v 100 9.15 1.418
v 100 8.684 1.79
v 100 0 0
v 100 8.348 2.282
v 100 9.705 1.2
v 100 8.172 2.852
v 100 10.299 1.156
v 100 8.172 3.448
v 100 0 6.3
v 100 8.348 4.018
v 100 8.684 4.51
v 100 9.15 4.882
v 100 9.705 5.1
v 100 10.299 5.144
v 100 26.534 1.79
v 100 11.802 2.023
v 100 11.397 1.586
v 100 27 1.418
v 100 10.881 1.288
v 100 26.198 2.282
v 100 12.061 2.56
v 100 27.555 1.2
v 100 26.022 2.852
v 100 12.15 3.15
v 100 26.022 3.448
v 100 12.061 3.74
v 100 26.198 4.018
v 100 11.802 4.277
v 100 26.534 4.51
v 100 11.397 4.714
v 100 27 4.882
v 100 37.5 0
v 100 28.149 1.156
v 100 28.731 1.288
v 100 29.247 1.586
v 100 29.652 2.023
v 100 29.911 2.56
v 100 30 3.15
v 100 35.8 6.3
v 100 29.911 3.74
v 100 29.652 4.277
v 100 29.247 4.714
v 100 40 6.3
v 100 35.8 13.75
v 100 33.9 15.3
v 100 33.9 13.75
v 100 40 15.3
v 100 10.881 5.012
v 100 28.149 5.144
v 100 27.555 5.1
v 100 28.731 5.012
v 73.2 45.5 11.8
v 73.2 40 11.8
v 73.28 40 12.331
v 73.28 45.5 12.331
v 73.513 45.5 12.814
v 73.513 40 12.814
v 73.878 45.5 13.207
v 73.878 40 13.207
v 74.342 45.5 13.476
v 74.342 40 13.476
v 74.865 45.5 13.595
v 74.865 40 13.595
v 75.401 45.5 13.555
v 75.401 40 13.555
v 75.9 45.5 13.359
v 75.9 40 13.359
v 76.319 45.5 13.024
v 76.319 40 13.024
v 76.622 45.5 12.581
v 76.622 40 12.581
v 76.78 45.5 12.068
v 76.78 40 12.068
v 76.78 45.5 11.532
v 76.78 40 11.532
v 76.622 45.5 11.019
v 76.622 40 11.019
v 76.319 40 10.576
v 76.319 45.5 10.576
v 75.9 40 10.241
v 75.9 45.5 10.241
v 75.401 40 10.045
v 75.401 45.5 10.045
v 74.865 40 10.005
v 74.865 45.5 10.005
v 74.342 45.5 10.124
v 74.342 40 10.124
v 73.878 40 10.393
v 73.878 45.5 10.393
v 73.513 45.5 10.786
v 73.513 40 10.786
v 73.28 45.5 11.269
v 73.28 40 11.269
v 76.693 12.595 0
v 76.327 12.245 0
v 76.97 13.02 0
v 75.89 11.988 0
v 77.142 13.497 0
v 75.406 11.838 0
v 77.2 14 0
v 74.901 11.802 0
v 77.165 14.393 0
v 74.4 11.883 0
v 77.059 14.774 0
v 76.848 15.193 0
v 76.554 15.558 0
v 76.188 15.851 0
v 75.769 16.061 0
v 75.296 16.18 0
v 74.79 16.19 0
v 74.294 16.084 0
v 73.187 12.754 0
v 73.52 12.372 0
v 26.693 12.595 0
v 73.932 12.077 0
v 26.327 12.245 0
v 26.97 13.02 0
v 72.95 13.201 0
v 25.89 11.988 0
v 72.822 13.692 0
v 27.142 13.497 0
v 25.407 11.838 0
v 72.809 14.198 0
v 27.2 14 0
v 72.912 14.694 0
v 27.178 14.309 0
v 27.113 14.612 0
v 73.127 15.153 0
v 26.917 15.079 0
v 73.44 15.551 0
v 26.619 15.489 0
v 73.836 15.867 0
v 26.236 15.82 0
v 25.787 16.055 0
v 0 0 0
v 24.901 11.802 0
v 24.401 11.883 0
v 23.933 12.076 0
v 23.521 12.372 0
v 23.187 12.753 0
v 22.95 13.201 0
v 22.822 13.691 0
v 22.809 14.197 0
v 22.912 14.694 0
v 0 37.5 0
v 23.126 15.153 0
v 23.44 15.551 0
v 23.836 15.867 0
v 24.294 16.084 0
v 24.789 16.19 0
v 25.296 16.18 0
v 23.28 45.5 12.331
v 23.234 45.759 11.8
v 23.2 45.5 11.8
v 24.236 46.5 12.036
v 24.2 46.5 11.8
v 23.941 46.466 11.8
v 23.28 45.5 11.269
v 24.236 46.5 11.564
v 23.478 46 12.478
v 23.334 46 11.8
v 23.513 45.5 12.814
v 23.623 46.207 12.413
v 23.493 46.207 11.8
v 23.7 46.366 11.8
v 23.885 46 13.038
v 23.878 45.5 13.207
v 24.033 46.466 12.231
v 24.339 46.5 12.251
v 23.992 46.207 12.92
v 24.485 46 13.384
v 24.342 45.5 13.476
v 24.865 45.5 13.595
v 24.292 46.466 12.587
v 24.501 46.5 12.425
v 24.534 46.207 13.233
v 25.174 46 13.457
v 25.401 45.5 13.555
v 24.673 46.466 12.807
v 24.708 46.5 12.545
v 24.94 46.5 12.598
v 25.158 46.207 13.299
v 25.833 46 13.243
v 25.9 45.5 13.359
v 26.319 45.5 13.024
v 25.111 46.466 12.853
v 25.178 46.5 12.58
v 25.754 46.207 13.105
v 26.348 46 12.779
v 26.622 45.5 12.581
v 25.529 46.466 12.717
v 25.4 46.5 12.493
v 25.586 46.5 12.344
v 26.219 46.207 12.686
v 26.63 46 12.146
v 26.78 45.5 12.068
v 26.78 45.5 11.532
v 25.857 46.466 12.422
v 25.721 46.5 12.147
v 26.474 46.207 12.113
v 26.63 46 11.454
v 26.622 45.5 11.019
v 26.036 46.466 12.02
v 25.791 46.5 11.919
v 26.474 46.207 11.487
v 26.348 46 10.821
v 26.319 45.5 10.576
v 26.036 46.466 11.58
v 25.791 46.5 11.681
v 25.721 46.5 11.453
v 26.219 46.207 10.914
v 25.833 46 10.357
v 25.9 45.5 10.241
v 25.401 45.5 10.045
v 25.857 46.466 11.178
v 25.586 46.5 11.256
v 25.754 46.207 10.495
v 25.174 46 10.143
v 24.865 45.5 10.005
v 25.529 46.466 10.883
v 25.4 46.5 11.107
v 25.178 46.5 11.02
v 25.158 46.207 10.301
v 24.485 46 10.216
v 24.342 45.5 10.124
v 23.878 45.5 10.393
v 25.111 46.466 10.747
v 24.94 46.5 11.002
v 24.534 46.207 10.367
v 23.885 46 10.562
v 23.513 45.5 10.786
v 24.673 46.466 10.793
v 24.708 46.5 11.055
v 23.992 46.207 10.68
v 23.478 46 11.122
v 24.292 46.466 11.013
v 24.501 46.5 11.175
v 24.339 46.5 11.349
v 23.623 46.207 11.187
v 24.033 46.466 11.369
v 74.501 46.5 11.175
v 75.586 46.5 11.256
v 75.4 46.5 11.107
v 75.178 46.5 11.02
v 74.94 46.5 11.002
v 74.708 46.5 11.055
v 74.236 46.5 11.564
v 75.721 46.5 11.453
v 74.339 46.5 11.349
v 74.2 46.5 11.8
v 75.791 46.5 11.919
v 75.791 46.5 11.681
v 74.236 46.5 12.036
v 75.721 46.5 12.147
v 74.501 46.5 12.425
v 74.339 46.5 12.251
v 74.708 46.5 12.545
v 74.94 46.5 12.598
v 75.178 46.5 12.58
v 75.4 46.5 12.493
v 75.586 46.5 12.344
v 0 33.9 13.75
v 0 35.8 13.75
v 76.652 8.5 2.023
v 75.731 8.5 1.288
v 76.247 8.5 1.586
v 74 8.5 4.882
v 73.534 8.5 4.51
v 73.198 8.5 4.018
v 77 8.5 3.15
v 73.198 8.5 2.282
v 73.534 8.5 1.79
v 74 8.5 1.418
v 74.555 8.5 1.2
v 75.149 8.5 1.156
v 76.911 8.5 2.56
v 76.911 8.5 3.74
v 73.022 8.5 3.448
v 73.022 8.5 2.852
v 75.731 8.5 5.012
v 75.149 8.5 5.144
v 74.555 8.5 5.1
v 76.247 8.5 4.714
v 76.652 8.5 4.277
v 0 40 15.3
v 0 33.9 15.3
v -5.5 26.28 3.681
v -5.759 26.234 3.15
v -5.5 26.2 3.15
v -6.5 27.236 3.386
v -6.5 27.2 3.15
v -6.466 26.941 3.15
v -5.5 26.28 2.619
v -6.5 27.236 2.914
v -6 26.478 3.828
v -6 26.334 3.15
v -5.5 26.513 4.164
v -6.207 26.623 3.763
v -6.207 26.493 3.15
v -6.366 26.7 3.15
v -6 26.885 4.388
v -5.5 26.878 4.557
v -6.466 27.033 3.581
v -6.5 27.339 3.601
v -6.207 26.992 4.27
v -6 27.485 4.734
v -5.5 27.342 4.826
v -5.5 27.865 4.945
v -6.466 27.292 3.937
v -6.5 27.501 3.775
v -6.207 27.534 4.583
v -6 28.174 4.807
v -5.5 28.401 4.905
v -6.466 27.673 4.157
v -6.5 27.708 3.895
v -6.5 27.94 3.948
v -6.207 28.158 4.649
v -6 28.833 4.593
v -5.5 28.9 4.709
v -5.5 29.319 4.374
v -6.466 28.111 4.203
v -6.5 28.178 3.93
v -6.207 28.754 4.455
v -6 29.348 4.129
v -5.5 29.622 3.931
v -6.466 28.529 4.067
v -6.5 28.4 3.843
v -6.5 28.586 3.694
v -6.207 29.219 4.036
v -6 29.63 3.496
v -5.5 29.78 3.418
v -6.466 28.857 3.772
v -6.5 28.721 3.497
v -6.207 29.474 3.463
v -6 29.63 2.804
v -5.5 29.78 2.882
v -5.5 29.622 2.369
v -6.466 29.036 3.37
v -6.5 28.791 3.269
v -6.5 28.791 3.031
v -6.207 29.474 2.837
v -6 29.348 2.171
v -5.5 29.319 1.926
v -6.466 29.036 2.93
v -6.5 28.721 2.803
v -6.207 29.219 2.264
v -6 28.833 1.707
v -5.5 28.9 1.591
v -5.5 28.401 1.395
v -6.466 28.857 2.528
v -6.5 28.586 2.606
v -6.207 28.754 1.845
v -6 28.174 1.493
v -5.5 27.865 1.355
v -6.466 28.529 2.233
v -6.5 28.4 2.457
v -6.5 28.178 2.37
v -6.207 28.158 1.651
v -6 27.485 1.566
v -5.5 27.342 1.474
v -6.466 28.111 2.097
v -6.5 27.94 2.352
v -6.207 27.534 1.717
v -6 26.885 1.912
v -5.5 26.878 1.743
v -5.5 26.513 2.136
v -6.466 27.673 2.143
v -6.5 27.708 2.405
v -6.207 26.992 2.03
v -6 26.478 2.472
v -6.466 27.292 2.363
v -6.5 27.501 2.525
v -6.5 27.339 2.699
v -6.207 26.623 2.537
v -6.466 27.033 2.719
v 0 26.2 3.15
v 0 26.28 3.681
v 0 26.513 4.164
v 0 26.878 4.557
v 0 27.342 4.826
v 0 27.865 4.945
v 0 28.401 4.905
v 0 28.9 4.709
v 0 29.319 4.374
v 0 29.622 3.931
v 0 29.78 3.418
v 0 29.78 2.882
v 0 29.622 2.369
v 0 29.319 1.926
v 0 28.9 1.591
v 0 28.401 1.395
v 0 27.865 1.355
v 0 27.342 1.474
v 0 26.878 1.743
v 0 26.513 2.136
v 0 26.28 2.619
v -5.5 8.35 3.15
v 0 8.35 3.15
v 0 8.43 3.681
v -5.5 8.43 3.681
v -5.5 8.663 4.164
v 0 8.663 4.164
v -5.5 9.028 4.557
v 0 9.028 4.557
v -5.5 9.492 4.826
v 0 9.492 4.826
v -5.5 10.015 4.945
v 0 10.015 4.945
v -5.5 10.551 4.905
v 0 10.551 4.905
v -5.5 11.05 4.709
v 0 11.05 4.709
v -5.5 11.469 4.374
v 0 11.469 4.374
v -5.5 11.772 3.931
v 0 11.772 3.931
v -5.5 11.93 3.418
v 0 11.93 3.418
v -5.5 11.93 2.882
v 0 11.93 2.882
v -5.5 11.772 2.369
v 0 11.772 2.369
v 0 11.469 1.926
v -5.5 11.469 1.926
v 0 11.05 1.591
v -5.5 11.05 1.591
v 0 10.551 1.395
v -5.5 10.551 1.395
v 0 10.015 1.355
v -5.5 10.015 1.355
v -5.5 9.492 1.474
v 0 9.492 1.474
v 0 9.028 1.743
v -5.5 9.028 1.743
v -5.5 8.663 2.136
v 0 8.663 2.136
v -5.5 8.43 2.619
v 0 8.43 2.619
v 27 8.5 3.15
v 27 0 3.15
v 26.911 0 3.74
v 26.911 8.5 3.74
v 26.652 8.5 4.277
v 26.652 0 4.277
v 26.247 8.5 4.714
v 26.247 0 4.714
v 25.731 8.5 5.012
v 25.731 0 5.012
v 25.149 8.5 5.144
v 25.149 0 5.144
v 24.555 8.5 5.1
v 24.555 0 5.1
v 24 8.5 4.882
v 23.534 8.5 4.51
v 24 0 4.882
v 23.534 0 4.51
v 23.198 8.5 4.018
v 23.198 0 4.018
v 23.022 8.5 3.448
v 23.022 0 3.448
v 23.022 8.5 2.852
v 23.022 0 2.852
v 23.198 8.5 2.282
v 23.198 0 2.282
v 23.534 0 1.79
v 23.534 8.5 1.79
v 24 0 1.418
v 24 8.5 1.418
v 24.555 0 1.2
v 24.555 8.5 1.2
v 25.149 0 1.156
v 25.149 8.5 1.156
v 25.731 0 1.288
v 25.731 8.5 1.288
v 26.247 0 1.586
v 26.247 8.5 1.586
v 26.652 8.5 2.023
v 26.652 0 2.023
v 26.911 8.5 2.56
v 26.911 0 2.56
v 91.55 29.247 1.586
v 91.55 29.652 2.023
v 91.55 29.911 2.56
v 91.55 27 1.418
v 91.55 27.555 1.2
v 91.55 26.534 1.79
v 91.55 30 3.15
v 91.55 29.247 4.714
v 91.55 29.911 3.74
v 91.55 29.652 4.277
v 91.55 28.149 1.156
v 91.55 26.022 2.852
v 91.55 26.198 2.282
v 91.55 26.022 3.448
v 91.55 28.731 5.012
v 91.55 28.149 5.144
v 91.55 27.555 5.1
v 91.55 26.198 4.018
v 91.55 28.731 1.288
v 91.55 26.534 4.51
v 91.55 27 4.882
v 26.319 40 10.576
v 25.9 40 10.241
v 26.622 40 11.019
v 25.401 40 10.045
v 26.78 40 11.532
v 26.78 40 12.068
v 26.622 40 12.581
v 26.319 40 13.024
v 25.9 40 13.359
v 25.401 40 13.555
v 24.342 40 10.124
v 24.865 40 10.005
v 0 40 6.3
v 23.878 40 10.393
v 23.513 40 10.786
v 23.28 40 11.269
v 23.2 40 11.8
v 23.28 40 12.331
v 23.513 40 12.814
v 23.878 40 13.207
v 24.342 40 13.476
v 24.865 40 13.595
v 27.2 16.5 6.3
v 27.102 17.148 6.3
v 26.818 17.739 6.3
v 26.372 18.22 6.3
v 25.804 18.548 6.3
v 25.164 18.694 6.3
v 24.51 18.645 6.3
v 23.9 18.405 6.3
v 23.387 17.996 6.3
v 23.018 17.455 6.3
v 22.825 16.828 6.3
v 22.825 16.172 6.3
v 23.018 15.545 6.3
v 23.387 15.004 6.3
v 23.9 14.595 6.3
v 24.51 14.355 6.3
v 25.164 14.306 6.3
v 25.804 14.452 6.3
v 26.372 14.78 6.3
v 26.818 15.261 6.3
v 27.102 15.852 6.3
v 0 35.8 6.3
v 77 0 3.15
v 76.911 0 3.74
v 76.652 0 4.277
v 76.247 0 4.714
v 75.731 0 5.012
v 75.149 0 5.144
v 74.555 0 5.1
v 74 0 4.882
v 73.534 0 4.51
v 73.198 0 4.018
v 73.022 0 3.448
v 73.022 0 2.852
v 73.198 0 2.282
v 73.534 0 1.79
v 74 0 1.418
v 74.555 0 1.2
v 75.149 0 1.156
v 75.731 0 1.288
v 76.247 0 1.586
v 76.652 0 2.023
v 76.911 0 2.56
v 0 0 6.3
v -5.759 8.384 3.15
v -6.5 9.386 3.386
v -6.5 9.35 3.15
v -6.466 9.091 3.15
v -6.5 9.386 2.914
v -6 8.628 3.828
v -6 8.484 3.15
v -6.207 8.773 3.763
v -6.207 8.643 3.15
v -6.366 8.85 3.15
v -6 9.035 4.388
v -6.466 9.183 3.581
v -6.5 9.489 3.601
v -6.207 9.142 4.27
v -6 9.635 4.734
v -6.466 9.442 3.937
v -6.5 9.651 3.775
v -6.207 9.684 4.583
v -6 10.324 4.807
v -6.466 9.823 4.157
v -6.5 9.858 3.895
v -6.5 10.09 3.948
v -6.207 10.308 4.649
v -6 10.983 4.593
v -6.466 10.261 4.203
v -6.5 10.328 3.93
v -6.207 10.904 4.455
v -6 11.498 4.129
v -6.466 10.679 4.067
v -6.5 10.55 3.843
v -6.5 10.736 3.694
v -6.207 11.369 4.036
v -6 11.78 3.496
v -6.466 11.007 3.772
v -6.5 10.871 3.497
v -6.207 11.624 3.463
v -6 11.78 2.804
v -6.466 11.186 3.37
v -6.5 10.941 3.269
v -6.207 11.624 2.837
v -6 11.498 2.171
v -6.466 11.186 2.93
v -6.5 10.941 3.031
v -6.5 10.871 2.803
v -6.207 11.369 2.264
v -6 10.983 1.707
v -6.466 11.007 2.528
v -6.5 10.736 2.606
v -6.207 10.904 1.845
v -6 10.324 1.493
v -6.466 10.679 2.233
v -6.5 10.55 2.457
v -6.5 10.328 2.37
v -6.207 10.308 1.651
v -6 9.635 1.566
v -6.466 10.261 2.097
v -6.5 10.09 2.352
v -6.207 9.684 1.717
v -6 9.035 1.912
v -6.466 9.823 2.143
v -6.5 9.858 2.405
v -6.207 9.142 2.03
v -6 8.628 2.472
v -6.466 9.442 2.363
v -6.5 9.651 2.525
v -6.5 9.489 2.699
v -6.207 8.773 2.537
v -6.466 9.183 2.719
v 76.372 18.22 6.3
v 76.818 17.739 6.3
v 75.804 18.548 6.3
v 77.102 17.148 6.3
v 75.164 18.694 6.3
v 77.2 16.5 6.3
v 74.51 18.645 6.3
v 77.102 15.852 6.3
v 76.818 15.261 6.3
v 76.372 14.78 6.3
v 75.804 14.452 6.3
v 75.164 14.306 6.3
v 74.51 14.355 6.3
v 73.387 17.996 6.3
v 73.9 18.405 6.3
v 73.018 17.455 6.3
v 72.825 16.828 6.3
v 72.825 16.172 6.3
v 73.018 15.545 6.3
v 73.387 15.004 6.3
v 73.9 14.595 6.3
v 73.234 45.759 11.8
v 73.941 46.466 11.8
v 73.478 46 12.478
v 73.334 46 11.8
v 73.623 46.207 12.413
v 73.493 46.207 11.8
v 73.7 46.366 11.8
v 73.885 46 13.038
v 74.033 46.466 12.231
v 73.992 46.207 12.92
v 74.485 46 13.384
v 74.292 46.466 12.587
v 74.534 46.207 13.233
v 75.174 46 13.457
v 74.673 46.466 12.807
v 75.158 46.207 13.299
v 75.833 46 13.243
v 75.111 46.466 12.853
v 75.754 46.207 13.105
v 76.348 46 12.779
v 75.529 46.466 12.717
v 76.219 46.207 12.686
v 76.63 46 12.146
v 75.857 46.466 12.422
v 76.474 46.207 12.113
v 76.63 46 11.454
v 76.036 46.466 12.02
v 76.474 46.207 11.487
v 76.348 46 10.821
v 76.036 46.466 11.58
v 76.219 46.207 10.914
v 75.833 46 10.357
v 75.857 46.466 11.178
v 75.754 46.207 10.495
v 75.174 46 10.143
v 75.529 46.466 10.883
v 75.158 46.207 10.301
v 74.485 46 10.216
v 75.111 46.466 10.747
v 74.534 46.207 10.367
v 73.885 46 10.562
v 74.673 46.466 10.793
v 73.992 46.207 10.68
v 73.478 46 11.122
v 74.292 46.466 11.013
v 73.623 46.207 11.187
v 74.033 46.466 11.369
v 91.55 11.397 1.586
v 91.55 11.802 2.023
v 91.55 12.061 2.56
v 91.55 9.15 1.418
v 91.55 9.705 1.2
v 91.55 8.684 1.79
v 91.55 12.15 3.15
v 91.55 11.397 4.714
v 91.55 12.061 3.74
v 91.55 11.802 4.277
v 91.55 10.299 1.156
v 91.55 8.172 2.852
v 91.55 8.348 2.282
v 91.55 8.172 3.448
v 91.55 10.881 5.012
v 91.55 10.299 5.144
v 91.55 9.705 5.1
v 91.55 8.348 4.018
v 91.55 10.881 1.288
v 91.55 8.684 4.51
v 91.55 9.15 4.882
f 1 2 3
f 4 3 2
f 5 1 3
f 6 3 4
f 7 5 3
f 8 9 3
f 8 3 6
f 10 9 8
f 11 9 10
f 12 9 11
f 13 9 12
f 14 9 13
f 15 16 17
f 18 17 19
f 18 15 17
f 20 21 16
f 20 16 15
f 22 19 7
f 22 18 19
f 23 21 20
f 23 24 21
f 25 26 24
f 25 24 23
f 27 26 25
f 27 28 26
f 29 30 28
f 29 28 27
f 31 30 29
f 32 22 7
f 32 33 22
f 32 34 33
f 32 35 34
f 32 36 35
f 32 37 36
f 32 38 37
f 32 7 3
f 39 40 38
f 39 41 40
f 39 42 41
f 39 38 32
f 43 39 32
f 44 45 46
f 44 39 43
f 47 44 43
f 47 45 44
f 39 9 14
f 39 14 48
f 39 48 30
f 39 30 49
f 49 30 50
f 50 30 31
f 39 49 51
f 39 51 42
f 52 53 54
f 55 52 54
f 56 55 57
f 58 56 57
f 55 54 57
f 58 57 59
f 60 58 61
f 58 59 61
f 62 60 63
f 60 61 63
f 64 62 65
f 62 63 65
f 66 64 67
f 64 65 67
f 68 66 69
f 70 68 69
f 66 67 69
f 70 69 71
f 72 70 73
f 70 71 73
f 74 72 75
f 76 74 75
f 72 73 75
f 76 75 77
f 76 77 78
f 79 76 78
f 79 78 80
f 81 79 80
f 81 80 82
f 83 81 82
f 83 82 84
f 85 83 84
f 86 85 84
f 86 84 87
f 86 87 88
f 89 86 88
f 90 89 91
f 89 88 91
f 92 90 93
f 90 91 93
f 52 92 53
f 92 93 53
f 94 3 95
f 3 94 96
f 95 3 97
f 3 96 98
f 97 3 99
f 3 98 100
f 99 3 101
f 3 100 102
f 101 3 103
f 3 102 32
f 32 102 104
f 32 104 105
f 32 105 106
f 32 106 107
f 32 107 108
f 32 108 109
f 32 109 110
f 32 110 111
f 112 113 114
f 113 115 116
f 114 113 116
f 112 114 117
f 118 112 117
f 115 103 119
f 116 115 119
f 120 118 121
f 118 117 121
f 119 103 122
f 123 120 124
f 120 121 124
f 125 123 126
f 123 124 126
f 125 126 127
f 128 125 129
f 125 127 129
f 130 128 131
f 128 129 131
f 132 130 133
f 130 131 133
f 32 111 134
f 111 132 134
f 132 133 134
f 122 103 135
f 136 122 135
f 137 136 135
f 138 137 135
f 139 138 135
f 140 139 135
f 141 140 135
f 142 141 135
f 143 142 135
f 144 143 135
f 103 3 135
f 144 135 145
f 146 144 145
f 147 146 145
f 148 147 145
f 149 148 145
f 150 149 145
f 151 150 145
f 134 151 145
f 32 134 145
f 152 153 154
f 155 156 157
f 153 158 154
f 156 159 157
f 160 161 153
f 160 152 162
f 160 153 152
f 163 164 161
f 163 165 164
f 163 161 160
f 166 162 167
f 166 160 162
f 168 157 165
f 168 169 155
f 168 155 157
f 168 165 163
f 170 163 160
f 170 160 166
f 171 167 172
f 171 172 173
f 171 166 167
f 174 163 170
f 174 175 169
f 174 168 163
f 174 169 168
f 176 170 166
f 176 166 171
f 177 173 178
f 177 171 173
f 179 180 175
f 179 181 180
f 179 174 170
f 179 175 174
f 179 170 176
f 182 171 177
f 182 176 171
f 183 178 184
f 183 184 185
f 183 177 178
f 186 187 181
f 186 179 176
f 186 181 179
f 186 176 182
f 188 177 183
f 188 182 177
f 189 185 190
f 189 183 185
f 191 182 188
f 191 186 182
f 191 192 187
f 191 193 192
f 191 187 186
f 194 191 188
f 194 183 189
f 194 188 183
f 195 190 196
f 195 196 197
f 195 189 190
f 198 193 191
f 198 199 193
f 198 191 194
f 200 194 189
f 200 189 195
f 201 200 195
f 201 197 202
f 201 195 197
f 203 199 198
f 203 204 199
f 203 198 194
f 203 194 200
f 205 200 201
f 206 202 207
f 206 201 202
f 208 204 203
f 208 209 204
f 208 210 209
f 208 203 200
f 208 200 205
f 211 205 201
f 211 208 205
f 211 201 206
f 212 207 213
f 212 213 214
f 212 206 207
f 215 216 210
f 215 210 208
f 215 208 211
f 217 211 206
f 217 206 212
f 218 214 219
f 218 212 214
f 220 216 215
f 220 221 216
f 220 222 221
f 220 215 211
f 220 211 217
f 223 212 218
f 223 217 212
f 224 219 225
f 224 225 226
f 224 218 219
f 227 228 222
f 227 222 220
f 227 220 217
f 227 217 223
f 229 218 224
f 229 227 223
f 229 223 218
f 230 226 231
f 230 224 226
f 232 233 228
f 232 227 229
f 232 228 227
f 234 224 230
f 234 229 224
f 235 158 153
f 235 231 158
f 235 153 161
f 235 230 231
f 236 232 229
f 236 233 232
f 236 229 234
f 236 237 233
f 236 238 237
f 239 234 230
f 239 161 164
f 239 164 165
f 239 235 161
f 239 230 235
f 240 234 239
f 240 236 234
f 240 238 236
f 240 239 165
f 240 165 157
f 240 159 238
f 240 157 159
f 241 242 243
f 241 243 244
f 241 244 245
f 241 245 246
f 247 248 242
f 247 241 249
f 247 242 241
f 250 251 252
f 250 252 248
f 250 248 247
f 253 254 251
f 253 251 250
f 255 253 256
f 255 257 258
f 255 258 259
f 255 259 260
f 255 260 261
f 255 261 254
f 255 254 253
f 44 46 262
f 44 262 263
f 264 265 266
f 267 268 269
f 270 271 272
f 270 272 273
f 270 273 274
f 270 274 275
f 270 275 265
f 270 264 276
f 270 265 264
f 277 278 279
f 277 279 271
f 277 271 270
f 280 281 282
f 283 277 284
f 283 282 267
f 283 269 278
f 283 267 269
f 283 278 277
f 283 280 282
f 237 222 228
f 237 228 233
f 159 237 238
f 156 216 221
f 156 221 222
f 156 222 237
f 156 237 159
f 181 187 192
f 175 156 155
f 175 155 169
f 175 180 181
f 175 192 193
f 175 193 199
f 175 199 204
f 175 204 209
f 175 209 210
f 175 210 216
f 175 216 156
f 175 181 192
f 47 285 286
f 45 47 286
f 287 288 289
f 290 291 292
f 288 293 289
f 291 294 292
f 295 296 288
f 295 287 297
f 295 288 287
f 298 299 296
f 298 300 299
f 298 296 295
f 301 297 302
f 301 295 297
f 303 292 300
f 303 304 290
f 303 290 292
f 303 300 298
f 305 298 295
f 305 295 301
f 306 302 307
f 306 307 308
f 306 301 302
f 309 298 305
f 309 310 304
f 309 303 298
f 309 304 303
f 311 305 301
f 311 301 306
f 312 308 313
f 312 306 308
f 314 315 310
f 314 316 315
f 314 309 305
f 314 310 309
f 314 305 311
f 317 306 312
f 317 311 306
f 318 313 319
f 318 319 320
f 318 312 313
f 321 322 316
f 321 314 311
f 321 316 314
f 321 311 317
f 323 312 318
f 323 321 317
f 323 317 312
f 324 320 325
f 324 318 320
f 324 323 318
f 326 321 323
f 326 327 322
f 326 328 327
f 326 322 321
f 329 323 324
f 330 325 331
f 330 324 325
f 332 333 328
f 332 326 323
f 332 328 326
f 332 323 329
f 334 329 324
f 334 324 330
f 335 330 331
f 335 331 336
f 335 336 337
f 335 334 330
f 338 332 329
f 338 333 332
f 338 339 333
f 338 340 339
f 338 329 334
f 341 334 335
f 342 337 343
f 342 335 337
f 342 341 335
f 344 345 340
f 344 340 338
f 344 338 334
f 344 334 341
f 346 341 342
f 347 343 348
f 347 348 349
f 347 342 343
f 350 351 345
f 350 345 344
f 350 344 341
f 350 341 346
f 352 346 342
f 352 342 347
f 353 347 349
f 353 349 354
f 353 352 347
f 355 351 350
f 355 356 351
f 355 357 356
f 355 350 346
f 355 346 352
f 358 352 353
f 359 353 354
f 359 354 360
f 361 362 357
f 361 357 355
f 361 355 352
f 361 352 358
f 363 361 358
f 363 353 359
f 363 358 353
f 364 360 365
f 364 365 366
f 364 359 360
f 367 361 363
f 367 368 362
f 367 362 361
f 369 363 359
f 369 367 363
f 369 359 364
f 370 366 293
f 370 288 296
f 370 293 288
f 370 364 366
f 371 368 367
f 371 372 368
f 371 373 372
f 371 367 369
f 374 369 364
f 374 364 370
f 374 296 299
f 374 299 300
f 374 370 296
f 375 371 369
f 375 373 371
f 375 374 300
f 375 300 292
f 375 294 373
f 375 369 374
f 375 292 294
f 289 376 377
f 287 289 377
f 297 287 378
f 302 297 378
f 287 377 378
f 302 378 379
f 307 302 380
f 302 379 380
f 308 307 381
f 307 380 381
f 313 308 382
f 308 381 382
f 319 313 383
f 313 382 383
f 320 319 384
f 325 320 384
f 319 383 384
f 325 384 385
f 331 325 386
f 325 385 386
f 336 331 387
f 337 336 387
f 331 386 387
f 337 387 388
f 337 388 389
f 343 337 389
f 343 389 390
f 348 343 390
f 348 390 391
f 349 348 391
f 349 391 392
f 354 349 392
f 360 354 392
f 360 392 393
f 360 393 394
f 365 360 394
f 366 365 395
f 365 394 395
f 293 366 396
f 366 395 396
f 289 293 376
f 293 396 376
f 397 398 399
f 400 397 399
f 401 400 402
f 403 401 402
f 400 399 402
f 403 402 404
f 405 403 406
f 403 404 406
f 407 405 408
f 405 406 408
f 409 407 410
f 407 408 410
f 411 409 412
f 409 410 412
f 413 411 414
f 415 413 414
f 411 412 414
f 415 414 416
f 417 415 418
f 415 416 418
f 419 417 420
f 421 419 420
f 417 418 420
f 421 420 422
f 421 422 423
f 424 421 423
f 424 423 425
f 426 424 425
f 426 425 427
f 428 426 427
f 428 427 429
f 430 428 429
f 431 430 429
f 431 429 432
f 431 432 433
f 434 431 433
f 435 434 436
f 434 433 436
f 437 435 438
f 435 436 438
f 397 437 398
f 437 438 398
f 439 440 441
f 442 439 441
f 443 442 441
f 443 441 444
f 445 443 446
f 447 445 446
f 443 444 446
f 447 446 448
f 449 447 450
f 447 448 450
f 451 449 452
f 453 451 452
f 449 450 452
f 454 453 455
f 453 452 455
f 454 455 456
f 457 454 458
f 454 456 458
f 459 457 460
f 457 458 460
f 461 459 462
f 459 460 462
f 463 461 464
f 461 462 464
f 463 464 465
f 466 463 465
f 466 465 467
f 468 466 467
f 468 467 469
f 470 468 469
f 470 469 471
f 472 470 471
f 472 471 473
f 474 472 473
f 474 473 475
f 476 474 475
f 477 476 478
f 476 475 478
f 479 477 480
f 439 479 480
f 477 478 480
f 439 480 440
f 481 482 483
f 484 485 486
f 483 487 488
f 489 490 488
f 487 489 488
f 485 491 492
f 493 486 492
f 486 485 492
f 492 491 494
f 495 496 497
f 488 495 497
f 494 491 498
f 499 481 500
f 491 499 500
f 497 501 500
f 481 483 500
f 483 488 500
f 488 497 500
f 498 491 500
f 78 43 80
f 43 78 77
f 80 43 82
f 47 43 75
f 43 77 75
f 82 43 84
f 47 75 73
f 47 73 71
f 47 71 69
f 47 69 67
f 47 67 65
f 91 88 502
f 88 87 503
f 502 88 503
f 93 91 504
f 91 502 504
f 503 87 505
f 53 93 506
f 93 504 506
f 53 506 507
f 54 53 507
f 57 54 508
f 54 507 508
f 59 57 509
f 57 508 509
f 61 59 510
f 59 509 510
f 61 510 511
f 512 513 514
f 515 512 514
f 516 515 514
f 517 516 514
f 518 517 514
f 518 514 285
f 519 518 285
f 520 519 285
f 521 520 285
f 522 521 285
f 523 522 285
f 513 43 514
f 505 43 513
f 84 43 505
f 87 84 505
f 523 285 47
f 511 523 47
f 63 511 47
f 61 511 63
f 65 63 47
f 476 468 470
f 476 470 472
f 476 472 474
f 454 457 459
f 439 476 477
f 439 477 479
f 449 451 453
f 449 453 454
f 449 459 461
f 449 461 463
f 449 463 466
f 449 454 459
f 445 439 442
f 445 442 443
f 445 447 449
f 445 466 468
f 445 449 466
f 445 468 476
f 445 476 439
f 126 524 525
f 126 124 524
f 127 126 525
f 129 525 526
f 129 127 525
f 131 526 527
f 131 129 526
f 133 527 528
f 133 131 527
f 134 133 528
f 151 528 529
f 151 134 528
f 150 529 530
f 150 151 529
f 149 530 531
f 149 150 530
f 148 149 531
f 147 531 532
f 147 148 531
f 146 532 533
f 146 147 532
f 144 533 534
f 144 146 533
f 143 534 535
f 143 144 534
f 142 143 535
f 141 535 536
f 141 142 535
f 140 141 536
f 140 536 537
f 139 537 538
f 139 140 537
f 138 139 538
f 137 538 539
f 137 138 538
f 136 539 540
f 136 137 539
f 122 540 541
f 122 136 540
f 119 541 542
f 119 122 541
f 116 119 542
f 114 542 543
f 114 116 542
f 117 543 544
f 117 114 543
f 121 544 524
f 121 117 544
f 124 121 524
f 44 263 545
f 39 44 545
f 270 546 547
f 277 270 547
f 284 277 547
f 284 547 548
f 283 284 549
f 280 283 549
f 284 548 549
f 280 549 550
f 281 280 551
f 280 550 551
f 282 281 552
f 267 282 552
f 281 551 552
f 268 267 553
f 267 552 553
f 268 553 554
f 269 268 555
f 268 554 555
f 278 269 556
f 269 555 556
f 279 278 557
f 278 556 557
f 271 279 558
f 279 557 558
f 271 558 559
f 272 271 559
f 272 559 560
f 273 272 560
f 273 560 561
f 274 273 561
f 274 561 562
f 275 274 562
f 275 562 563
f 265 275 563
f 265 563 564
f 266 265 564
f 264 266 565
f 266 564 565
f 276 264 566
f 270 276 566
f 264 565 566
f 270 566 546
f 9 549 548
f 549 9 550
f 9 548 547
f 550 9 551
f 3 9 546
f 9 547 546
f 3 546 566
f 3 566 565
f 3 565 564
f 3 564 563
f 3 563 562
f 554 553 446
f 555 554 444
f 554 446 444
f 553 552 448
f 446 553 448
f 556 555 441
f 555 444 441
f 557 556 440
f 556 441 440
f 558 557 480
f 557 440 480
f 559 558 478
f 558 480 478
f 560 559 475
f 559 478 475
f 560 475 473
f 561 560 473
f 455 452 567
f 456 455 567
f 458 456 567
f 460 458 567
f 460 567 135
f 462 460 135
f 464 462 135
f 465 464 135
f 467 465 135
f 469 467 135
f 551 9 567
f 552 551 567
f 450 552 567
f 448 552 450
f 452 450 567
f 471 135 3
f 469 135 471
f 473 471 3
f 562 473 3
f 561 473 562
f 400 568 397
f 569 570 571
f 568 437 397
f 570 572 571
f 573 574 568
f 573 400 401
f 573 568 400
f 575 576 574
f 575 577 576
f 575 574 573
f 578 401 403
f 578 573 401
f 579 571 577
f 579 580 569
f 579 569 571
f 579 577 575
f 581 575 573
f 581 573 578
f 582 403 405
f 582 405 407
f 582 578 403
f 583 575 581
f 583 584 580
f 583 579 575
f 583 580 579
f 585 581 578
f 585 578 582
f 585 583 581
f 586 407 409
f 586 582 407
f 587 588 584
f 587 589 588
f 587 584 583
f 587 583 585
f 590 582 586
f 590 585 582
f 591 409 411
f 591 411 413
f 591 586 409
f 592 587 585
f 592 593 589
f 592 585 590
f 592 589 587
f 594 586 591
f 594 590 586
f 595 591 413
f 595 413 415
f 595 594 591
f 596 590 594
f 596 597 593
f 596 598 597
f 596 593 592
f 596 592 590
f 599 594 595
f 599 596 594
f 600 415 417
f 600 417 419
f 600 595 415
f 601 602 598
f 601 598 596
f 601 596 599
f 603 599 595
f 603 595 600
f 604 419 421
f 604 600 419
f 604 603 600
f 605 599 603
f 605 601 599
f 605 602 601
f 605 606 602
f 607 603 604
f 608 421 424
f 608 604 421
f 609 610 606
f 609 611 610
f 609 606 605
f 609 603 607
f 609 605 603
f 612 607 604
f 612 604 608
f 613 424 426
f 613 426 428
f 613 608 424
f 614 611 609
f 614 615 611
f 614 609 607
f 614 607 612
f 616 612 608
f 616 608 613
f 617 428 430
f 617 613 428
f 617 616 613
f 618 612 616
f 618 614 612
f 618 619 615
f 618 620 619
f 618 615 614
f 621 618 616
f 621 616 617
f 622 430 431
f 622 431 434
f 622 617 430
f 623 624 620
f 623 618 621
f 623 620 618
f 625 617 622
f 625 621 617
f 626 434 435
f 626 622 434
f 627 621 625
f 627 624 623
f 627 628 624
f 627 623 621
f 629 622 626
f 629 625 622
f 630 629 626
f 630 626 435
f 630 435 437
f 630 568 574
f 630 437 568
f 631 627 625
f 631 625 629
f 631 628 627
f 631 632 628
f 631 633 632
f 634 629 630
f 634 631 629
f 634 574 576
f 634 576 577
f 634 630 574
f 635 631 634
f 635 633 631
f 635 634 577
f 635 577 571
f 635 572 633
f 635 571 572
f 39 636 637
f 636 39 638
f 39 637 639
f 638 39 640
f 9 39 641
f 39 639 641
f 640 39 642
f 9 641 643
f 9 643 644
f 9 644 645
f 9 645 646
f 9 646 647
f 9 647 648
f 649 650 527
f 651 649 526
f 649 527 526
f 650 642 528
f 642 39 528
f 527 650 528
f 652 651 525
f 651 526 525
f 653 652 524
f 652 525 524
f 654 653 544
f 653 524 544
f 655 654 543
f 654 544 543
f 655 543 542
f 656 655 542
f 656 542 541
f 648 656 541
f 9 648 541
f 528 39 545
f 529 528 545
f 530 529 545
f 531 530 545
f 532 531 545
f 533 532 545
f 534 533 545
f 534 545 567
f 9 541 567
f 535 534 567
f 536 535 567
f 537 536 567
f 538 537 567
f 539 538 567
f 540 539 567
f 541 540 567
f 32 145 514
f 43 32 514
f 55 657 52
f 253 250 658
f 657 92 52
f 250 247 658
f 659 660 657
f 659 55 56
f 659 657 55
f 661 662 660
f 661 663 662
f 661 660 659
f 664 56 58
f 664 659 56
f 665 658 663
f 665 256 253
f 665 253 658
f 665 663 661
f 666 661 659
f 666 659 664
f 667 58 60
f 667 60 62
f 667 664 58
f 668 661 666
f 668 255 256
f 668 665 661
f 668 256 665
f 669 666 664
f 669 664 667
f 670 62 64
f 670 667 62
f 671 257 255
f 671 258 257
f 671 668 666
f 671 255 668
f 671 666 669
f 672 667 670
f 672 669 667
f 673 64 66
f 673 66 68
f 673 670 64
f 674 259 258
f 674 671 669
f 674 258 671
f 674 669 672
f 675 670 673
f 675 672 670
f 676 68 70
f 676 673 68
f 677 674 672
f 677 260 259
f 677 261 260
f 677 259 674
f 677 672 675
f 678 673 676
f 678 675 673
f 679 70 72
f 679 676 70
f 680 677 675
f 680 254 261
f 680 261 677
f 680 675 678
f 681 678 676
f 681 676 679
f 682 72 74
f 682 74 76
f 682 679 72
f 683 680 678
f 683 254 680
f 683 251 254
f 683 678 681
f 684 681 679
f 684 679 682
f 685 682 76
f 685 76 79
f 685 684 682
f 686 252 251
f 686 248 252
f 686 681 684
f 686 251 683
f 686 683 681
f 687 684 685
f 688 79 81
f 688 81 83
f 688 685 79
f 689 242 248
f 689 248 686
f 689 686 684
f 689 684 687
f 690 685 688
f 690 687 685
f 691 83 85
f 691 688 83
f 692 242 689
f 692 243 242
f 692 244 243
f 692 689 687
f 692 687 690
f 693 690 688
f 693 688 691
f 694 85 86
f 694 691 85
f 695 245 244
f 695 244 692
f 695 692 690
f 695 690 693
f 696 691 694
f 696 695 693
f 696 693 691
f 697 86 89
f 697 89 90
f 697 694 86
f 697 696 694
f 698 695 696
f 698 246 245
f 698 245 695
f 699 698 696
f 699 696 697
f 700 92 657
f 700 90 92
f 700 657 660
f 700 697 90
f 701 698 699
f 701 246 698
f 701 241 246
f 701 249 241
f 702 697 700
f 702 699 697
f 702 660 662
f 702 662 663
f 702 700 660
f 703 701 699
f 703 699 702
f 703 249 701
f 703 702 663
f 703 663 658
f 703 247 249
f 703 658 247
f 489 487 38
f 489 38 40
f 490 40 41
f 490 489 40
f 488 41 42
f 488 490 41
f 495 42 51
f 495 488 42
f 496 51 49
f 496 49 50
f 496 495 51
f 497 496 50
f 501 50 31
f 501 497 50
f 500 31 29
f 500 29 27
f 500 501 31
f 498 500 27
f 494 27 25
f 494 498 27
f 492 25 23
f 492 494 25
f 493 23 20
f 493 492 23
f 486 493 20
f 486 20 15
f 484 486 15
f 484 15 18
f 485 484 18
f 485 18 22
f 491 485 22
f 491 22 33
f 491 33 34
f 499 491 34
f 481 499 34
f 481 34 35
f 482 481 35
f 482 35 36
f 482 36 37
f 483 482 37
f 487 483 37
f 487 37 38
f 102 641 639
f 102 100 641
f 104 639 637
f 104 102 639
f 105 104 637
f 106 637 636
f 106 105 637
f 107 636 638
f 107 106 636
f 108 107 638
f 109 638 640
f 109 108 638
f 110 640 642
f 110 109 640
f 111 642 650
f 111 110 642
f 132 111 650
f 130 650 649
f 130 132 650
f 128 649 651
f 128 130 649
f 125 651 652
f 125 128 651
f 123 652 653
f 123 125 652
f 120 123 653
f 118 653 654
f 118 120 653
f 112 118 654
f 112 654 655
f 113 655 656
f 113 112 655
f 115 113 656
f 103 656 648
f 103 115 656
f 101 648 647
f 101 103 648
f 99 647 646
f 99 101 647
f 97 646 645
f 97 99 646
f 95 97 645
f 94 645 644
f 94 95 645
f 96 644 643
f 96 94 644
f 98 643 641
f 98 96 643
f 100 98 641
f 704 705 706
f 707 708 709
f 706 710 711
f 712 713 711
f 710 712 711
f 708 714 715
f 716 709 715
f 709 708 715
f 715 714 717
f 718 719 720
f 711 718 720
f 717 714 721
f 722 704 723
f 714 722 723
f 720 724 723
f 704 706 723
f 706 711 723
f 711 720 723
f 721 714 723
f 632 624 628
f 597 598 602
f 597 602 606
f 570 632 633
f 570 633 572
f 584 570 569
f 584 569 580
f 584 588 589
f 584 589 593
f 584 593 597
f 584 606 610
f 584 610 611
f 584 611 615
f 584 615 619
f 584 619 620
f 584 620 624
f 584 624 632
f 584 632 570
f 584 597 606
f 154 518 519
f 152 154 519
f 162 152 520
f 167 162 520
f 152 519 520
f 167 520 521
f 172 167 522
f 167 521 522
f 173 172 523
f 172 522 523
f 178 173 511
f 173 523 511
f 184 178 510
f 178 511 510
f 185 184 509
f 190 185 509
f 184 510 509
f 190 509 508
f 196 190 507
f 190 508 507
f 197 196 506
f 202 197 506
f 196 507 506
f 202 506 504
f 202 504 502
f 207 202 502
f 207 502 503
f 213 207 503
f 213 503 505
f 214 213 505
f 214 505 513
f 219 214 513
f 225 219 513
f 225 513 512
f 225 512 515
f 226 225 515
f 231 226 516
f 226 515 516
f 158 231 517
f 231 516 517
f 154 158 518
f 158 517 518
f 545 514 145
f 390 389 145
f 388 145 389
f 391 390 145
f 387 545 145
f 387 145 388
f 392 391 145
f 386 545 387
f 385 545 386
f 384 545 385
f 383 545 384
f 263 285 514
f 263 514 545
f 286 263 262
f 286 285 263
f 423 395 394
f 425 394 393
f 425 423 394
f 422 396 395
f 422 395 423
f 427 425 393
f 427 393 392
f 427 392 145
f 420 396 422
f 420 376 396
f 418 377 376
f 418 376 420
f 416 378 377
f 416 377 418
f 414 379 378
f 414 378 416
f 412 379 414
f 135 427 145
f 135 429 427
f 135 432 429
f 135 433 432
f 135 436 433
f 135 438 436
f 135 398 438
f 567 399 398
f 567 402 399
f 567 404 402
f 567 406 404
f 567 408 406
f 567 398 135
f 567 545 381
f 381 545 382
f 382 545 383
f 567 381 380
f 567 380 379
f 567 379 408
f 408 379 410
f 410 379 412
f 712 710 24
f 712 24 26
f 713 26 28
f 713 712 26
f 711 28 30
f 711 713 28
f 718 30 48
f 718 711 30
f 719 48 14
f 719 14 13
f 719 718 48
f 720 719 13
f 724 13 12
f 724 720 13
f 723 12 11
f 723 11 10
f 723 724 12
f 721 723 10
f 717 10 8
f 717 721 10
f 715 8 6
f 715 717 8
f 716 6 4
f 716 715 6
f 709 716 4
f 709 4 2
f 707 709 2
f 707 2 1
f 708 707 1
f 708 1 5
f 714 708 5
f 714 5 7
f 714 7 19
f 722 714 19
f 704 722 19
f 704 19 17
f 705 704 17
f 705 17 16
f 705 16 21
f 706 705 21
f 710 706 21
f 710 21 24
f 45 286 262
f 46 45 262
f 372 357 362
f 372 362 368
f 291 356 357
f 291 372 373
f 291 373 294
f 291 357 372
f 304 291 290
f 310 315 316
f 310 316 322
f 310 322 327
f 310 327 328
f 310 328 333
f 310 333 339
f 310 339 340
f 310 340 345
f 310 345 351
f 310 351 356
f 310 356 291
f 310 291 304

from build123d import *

# Parameters (mm, degrees)
F0_R      = 2
F1_DEPTH  = 100
F6_R      = 2
F6_R_2    = 1.8
F7_DEPTH  = 91.55
F8_DEPTH  = 6.5
F9_R      = 1
F10_R     = 1
F2_R      = 2.2
F13_R     = 2
F14_DEPTH = 8.5
F15_R     = 1.8
F16_DEPTH = 6.5
F17_R     = 1
F18_R     = 1


with BuildPart() as f1:
    # F0 (on Right) → F1 (new body)
    with BuildSketch(Plane.YZ):
        Polygon((37.5, 0), (40, 6.3), (40, 15.3), (33.9, 15.3), (33.9, 13.75), (35.8, 13.75), (35.8, 6.3), (0, 6.3), (0, 0), align=None)
        with Locations((10.15, 3.15)):
            Circle(F0_R, mode=Mode.SUBTRACT)
        with Locations((28, 3.15)):
            Circle(F0_R, mode=Mode.SUBTRACT)
    extrude(amount=F1_DEPTH)

    # F6 (on face) → F7 (join)
    with BuildSketch(Plane(origin=(0, 0, 0), x_dir=(0, -1, 0), z_dir=(-1, 0, 0))):
        with Locations((-28, 3.15)):
            Circle(F6_R)
        with Locations((-28, 3.15)):
            Circle(F6_R_2, mode=Mode.SUBTRACT)
        with Locations((-10.15, 3.15)):
            Circle(F6_R)
        with Locations((-10.15, 3.15)):
            Circle(F6_R_2, mode=Mode.SUBTRACT)
        with Locations((-28, 3.15)):
            Circle(F6_R_2)
        with Locations((-10.15, 3.15)):
            Circle(F6_R_2)
    extrude(amount=-F7_DEPTH)

    # F6 (on face) → F8 (join)
    with BuildSketch(Plane(origin=(0, 0, 0), x_dir=(0, -1, 0), z_dir=(-1, 0, 0))):
        with Locations((-28, 3.15)):
            Circle(F6_R_2)
        with Locations((-10.15, 3.15)):
            Circle(F6_R_2)
    extrude(amount=F8_DEPTH)

    # F9
    f9_edges = [f1.edges().sort_by_distance(p)[0] for p in [
        (-6.5, 29.8, 3.15),
    ]]
    fillet(f9_edges, radius=F9_R)

    # F10
    f10_edges = [f1.edges().sort_by_distance(p)[0] for p in [
        (-6.5, 11.95, 3.15),
    ]]
    fillet(f10_edges, radius=F10_R)

    # F11: sweep along a path in F5
    with BuildLine(Plane(origin=(0, 10.3674357858, -4.1140618198), x_dir=(-1, 0, 0), z_dir=(0, 0.9294907112, -0.3688455203))) as f11_path:
        Line((-74.083484861, 4.4261462437), (-74.083484861, -4.2147375643))
    # F2 (on face) → F11 (sweep, cut)
    with BuildSketch(Plane.XY.offset(6.3)):
        with Locations((25, 16.5)):
            Circle(F2_R)
    sweep(path=f11_path.line, mode=Mode.SUBTRACT)

    # F12: sweep along a path in F5
    with BuildLine(Plane(origin=(0, 10.3674357858, -4.1140618198), x_dir=(-1, 0, 0), z_dir=(0, 0.9294907112, -0.3688455203))) as f12_path:
        Line((-24.083484861, 11.2040515248), (-24.083484861, -2.310390817))
    # F2 (on face) → F12 (sweep, cut)
    with BuildSketch(Plane.XY.offset(6.3)):
        with Locations((75, 16.5)):
            Circle(F2_R)
    sweep(path=f12_path.line, mode=Mode.SUBTRACT)

    # F13 (on face) → F14 (cut)
    with BuildSketch(Plane.XZ):
        with Locations((25, 3.15)):
            Circle(F13_R)
        with Locations((75, 3.15)):
            Circle(F13_R)
    extrude(amount=-F14_DEPTH, mode=Mode.SUBTRACT)

    # F15 (on face) → F16 (join)
    with BuildSketch(Plane(origin=(0, 40, 0), x_dir=(-1, 0, 0), z_dir=(0, 1, 0))):
        with Locations((-75, 11.8)):
            Circle(F15_R)
        with Locations((-25, 11.8)):
            Circle(F15_R)
    extrude(amount=F16_DEPTH)

    # F17
    f17_edges = [f1.edges().sort_by_distance(p)[0] for p in [
        (76.8, 46.5, 11.8),
    ]]
    fillet(f17_edges, radius=F17_R)

    # F18
    f18_edges = [f1.edges().sort_by_distance(p)[0] for p in [
        (26.8, 46.5, 11.8),
    ]]
    fillet(f18_edges, radius=F18_R)


solid = f1.part
